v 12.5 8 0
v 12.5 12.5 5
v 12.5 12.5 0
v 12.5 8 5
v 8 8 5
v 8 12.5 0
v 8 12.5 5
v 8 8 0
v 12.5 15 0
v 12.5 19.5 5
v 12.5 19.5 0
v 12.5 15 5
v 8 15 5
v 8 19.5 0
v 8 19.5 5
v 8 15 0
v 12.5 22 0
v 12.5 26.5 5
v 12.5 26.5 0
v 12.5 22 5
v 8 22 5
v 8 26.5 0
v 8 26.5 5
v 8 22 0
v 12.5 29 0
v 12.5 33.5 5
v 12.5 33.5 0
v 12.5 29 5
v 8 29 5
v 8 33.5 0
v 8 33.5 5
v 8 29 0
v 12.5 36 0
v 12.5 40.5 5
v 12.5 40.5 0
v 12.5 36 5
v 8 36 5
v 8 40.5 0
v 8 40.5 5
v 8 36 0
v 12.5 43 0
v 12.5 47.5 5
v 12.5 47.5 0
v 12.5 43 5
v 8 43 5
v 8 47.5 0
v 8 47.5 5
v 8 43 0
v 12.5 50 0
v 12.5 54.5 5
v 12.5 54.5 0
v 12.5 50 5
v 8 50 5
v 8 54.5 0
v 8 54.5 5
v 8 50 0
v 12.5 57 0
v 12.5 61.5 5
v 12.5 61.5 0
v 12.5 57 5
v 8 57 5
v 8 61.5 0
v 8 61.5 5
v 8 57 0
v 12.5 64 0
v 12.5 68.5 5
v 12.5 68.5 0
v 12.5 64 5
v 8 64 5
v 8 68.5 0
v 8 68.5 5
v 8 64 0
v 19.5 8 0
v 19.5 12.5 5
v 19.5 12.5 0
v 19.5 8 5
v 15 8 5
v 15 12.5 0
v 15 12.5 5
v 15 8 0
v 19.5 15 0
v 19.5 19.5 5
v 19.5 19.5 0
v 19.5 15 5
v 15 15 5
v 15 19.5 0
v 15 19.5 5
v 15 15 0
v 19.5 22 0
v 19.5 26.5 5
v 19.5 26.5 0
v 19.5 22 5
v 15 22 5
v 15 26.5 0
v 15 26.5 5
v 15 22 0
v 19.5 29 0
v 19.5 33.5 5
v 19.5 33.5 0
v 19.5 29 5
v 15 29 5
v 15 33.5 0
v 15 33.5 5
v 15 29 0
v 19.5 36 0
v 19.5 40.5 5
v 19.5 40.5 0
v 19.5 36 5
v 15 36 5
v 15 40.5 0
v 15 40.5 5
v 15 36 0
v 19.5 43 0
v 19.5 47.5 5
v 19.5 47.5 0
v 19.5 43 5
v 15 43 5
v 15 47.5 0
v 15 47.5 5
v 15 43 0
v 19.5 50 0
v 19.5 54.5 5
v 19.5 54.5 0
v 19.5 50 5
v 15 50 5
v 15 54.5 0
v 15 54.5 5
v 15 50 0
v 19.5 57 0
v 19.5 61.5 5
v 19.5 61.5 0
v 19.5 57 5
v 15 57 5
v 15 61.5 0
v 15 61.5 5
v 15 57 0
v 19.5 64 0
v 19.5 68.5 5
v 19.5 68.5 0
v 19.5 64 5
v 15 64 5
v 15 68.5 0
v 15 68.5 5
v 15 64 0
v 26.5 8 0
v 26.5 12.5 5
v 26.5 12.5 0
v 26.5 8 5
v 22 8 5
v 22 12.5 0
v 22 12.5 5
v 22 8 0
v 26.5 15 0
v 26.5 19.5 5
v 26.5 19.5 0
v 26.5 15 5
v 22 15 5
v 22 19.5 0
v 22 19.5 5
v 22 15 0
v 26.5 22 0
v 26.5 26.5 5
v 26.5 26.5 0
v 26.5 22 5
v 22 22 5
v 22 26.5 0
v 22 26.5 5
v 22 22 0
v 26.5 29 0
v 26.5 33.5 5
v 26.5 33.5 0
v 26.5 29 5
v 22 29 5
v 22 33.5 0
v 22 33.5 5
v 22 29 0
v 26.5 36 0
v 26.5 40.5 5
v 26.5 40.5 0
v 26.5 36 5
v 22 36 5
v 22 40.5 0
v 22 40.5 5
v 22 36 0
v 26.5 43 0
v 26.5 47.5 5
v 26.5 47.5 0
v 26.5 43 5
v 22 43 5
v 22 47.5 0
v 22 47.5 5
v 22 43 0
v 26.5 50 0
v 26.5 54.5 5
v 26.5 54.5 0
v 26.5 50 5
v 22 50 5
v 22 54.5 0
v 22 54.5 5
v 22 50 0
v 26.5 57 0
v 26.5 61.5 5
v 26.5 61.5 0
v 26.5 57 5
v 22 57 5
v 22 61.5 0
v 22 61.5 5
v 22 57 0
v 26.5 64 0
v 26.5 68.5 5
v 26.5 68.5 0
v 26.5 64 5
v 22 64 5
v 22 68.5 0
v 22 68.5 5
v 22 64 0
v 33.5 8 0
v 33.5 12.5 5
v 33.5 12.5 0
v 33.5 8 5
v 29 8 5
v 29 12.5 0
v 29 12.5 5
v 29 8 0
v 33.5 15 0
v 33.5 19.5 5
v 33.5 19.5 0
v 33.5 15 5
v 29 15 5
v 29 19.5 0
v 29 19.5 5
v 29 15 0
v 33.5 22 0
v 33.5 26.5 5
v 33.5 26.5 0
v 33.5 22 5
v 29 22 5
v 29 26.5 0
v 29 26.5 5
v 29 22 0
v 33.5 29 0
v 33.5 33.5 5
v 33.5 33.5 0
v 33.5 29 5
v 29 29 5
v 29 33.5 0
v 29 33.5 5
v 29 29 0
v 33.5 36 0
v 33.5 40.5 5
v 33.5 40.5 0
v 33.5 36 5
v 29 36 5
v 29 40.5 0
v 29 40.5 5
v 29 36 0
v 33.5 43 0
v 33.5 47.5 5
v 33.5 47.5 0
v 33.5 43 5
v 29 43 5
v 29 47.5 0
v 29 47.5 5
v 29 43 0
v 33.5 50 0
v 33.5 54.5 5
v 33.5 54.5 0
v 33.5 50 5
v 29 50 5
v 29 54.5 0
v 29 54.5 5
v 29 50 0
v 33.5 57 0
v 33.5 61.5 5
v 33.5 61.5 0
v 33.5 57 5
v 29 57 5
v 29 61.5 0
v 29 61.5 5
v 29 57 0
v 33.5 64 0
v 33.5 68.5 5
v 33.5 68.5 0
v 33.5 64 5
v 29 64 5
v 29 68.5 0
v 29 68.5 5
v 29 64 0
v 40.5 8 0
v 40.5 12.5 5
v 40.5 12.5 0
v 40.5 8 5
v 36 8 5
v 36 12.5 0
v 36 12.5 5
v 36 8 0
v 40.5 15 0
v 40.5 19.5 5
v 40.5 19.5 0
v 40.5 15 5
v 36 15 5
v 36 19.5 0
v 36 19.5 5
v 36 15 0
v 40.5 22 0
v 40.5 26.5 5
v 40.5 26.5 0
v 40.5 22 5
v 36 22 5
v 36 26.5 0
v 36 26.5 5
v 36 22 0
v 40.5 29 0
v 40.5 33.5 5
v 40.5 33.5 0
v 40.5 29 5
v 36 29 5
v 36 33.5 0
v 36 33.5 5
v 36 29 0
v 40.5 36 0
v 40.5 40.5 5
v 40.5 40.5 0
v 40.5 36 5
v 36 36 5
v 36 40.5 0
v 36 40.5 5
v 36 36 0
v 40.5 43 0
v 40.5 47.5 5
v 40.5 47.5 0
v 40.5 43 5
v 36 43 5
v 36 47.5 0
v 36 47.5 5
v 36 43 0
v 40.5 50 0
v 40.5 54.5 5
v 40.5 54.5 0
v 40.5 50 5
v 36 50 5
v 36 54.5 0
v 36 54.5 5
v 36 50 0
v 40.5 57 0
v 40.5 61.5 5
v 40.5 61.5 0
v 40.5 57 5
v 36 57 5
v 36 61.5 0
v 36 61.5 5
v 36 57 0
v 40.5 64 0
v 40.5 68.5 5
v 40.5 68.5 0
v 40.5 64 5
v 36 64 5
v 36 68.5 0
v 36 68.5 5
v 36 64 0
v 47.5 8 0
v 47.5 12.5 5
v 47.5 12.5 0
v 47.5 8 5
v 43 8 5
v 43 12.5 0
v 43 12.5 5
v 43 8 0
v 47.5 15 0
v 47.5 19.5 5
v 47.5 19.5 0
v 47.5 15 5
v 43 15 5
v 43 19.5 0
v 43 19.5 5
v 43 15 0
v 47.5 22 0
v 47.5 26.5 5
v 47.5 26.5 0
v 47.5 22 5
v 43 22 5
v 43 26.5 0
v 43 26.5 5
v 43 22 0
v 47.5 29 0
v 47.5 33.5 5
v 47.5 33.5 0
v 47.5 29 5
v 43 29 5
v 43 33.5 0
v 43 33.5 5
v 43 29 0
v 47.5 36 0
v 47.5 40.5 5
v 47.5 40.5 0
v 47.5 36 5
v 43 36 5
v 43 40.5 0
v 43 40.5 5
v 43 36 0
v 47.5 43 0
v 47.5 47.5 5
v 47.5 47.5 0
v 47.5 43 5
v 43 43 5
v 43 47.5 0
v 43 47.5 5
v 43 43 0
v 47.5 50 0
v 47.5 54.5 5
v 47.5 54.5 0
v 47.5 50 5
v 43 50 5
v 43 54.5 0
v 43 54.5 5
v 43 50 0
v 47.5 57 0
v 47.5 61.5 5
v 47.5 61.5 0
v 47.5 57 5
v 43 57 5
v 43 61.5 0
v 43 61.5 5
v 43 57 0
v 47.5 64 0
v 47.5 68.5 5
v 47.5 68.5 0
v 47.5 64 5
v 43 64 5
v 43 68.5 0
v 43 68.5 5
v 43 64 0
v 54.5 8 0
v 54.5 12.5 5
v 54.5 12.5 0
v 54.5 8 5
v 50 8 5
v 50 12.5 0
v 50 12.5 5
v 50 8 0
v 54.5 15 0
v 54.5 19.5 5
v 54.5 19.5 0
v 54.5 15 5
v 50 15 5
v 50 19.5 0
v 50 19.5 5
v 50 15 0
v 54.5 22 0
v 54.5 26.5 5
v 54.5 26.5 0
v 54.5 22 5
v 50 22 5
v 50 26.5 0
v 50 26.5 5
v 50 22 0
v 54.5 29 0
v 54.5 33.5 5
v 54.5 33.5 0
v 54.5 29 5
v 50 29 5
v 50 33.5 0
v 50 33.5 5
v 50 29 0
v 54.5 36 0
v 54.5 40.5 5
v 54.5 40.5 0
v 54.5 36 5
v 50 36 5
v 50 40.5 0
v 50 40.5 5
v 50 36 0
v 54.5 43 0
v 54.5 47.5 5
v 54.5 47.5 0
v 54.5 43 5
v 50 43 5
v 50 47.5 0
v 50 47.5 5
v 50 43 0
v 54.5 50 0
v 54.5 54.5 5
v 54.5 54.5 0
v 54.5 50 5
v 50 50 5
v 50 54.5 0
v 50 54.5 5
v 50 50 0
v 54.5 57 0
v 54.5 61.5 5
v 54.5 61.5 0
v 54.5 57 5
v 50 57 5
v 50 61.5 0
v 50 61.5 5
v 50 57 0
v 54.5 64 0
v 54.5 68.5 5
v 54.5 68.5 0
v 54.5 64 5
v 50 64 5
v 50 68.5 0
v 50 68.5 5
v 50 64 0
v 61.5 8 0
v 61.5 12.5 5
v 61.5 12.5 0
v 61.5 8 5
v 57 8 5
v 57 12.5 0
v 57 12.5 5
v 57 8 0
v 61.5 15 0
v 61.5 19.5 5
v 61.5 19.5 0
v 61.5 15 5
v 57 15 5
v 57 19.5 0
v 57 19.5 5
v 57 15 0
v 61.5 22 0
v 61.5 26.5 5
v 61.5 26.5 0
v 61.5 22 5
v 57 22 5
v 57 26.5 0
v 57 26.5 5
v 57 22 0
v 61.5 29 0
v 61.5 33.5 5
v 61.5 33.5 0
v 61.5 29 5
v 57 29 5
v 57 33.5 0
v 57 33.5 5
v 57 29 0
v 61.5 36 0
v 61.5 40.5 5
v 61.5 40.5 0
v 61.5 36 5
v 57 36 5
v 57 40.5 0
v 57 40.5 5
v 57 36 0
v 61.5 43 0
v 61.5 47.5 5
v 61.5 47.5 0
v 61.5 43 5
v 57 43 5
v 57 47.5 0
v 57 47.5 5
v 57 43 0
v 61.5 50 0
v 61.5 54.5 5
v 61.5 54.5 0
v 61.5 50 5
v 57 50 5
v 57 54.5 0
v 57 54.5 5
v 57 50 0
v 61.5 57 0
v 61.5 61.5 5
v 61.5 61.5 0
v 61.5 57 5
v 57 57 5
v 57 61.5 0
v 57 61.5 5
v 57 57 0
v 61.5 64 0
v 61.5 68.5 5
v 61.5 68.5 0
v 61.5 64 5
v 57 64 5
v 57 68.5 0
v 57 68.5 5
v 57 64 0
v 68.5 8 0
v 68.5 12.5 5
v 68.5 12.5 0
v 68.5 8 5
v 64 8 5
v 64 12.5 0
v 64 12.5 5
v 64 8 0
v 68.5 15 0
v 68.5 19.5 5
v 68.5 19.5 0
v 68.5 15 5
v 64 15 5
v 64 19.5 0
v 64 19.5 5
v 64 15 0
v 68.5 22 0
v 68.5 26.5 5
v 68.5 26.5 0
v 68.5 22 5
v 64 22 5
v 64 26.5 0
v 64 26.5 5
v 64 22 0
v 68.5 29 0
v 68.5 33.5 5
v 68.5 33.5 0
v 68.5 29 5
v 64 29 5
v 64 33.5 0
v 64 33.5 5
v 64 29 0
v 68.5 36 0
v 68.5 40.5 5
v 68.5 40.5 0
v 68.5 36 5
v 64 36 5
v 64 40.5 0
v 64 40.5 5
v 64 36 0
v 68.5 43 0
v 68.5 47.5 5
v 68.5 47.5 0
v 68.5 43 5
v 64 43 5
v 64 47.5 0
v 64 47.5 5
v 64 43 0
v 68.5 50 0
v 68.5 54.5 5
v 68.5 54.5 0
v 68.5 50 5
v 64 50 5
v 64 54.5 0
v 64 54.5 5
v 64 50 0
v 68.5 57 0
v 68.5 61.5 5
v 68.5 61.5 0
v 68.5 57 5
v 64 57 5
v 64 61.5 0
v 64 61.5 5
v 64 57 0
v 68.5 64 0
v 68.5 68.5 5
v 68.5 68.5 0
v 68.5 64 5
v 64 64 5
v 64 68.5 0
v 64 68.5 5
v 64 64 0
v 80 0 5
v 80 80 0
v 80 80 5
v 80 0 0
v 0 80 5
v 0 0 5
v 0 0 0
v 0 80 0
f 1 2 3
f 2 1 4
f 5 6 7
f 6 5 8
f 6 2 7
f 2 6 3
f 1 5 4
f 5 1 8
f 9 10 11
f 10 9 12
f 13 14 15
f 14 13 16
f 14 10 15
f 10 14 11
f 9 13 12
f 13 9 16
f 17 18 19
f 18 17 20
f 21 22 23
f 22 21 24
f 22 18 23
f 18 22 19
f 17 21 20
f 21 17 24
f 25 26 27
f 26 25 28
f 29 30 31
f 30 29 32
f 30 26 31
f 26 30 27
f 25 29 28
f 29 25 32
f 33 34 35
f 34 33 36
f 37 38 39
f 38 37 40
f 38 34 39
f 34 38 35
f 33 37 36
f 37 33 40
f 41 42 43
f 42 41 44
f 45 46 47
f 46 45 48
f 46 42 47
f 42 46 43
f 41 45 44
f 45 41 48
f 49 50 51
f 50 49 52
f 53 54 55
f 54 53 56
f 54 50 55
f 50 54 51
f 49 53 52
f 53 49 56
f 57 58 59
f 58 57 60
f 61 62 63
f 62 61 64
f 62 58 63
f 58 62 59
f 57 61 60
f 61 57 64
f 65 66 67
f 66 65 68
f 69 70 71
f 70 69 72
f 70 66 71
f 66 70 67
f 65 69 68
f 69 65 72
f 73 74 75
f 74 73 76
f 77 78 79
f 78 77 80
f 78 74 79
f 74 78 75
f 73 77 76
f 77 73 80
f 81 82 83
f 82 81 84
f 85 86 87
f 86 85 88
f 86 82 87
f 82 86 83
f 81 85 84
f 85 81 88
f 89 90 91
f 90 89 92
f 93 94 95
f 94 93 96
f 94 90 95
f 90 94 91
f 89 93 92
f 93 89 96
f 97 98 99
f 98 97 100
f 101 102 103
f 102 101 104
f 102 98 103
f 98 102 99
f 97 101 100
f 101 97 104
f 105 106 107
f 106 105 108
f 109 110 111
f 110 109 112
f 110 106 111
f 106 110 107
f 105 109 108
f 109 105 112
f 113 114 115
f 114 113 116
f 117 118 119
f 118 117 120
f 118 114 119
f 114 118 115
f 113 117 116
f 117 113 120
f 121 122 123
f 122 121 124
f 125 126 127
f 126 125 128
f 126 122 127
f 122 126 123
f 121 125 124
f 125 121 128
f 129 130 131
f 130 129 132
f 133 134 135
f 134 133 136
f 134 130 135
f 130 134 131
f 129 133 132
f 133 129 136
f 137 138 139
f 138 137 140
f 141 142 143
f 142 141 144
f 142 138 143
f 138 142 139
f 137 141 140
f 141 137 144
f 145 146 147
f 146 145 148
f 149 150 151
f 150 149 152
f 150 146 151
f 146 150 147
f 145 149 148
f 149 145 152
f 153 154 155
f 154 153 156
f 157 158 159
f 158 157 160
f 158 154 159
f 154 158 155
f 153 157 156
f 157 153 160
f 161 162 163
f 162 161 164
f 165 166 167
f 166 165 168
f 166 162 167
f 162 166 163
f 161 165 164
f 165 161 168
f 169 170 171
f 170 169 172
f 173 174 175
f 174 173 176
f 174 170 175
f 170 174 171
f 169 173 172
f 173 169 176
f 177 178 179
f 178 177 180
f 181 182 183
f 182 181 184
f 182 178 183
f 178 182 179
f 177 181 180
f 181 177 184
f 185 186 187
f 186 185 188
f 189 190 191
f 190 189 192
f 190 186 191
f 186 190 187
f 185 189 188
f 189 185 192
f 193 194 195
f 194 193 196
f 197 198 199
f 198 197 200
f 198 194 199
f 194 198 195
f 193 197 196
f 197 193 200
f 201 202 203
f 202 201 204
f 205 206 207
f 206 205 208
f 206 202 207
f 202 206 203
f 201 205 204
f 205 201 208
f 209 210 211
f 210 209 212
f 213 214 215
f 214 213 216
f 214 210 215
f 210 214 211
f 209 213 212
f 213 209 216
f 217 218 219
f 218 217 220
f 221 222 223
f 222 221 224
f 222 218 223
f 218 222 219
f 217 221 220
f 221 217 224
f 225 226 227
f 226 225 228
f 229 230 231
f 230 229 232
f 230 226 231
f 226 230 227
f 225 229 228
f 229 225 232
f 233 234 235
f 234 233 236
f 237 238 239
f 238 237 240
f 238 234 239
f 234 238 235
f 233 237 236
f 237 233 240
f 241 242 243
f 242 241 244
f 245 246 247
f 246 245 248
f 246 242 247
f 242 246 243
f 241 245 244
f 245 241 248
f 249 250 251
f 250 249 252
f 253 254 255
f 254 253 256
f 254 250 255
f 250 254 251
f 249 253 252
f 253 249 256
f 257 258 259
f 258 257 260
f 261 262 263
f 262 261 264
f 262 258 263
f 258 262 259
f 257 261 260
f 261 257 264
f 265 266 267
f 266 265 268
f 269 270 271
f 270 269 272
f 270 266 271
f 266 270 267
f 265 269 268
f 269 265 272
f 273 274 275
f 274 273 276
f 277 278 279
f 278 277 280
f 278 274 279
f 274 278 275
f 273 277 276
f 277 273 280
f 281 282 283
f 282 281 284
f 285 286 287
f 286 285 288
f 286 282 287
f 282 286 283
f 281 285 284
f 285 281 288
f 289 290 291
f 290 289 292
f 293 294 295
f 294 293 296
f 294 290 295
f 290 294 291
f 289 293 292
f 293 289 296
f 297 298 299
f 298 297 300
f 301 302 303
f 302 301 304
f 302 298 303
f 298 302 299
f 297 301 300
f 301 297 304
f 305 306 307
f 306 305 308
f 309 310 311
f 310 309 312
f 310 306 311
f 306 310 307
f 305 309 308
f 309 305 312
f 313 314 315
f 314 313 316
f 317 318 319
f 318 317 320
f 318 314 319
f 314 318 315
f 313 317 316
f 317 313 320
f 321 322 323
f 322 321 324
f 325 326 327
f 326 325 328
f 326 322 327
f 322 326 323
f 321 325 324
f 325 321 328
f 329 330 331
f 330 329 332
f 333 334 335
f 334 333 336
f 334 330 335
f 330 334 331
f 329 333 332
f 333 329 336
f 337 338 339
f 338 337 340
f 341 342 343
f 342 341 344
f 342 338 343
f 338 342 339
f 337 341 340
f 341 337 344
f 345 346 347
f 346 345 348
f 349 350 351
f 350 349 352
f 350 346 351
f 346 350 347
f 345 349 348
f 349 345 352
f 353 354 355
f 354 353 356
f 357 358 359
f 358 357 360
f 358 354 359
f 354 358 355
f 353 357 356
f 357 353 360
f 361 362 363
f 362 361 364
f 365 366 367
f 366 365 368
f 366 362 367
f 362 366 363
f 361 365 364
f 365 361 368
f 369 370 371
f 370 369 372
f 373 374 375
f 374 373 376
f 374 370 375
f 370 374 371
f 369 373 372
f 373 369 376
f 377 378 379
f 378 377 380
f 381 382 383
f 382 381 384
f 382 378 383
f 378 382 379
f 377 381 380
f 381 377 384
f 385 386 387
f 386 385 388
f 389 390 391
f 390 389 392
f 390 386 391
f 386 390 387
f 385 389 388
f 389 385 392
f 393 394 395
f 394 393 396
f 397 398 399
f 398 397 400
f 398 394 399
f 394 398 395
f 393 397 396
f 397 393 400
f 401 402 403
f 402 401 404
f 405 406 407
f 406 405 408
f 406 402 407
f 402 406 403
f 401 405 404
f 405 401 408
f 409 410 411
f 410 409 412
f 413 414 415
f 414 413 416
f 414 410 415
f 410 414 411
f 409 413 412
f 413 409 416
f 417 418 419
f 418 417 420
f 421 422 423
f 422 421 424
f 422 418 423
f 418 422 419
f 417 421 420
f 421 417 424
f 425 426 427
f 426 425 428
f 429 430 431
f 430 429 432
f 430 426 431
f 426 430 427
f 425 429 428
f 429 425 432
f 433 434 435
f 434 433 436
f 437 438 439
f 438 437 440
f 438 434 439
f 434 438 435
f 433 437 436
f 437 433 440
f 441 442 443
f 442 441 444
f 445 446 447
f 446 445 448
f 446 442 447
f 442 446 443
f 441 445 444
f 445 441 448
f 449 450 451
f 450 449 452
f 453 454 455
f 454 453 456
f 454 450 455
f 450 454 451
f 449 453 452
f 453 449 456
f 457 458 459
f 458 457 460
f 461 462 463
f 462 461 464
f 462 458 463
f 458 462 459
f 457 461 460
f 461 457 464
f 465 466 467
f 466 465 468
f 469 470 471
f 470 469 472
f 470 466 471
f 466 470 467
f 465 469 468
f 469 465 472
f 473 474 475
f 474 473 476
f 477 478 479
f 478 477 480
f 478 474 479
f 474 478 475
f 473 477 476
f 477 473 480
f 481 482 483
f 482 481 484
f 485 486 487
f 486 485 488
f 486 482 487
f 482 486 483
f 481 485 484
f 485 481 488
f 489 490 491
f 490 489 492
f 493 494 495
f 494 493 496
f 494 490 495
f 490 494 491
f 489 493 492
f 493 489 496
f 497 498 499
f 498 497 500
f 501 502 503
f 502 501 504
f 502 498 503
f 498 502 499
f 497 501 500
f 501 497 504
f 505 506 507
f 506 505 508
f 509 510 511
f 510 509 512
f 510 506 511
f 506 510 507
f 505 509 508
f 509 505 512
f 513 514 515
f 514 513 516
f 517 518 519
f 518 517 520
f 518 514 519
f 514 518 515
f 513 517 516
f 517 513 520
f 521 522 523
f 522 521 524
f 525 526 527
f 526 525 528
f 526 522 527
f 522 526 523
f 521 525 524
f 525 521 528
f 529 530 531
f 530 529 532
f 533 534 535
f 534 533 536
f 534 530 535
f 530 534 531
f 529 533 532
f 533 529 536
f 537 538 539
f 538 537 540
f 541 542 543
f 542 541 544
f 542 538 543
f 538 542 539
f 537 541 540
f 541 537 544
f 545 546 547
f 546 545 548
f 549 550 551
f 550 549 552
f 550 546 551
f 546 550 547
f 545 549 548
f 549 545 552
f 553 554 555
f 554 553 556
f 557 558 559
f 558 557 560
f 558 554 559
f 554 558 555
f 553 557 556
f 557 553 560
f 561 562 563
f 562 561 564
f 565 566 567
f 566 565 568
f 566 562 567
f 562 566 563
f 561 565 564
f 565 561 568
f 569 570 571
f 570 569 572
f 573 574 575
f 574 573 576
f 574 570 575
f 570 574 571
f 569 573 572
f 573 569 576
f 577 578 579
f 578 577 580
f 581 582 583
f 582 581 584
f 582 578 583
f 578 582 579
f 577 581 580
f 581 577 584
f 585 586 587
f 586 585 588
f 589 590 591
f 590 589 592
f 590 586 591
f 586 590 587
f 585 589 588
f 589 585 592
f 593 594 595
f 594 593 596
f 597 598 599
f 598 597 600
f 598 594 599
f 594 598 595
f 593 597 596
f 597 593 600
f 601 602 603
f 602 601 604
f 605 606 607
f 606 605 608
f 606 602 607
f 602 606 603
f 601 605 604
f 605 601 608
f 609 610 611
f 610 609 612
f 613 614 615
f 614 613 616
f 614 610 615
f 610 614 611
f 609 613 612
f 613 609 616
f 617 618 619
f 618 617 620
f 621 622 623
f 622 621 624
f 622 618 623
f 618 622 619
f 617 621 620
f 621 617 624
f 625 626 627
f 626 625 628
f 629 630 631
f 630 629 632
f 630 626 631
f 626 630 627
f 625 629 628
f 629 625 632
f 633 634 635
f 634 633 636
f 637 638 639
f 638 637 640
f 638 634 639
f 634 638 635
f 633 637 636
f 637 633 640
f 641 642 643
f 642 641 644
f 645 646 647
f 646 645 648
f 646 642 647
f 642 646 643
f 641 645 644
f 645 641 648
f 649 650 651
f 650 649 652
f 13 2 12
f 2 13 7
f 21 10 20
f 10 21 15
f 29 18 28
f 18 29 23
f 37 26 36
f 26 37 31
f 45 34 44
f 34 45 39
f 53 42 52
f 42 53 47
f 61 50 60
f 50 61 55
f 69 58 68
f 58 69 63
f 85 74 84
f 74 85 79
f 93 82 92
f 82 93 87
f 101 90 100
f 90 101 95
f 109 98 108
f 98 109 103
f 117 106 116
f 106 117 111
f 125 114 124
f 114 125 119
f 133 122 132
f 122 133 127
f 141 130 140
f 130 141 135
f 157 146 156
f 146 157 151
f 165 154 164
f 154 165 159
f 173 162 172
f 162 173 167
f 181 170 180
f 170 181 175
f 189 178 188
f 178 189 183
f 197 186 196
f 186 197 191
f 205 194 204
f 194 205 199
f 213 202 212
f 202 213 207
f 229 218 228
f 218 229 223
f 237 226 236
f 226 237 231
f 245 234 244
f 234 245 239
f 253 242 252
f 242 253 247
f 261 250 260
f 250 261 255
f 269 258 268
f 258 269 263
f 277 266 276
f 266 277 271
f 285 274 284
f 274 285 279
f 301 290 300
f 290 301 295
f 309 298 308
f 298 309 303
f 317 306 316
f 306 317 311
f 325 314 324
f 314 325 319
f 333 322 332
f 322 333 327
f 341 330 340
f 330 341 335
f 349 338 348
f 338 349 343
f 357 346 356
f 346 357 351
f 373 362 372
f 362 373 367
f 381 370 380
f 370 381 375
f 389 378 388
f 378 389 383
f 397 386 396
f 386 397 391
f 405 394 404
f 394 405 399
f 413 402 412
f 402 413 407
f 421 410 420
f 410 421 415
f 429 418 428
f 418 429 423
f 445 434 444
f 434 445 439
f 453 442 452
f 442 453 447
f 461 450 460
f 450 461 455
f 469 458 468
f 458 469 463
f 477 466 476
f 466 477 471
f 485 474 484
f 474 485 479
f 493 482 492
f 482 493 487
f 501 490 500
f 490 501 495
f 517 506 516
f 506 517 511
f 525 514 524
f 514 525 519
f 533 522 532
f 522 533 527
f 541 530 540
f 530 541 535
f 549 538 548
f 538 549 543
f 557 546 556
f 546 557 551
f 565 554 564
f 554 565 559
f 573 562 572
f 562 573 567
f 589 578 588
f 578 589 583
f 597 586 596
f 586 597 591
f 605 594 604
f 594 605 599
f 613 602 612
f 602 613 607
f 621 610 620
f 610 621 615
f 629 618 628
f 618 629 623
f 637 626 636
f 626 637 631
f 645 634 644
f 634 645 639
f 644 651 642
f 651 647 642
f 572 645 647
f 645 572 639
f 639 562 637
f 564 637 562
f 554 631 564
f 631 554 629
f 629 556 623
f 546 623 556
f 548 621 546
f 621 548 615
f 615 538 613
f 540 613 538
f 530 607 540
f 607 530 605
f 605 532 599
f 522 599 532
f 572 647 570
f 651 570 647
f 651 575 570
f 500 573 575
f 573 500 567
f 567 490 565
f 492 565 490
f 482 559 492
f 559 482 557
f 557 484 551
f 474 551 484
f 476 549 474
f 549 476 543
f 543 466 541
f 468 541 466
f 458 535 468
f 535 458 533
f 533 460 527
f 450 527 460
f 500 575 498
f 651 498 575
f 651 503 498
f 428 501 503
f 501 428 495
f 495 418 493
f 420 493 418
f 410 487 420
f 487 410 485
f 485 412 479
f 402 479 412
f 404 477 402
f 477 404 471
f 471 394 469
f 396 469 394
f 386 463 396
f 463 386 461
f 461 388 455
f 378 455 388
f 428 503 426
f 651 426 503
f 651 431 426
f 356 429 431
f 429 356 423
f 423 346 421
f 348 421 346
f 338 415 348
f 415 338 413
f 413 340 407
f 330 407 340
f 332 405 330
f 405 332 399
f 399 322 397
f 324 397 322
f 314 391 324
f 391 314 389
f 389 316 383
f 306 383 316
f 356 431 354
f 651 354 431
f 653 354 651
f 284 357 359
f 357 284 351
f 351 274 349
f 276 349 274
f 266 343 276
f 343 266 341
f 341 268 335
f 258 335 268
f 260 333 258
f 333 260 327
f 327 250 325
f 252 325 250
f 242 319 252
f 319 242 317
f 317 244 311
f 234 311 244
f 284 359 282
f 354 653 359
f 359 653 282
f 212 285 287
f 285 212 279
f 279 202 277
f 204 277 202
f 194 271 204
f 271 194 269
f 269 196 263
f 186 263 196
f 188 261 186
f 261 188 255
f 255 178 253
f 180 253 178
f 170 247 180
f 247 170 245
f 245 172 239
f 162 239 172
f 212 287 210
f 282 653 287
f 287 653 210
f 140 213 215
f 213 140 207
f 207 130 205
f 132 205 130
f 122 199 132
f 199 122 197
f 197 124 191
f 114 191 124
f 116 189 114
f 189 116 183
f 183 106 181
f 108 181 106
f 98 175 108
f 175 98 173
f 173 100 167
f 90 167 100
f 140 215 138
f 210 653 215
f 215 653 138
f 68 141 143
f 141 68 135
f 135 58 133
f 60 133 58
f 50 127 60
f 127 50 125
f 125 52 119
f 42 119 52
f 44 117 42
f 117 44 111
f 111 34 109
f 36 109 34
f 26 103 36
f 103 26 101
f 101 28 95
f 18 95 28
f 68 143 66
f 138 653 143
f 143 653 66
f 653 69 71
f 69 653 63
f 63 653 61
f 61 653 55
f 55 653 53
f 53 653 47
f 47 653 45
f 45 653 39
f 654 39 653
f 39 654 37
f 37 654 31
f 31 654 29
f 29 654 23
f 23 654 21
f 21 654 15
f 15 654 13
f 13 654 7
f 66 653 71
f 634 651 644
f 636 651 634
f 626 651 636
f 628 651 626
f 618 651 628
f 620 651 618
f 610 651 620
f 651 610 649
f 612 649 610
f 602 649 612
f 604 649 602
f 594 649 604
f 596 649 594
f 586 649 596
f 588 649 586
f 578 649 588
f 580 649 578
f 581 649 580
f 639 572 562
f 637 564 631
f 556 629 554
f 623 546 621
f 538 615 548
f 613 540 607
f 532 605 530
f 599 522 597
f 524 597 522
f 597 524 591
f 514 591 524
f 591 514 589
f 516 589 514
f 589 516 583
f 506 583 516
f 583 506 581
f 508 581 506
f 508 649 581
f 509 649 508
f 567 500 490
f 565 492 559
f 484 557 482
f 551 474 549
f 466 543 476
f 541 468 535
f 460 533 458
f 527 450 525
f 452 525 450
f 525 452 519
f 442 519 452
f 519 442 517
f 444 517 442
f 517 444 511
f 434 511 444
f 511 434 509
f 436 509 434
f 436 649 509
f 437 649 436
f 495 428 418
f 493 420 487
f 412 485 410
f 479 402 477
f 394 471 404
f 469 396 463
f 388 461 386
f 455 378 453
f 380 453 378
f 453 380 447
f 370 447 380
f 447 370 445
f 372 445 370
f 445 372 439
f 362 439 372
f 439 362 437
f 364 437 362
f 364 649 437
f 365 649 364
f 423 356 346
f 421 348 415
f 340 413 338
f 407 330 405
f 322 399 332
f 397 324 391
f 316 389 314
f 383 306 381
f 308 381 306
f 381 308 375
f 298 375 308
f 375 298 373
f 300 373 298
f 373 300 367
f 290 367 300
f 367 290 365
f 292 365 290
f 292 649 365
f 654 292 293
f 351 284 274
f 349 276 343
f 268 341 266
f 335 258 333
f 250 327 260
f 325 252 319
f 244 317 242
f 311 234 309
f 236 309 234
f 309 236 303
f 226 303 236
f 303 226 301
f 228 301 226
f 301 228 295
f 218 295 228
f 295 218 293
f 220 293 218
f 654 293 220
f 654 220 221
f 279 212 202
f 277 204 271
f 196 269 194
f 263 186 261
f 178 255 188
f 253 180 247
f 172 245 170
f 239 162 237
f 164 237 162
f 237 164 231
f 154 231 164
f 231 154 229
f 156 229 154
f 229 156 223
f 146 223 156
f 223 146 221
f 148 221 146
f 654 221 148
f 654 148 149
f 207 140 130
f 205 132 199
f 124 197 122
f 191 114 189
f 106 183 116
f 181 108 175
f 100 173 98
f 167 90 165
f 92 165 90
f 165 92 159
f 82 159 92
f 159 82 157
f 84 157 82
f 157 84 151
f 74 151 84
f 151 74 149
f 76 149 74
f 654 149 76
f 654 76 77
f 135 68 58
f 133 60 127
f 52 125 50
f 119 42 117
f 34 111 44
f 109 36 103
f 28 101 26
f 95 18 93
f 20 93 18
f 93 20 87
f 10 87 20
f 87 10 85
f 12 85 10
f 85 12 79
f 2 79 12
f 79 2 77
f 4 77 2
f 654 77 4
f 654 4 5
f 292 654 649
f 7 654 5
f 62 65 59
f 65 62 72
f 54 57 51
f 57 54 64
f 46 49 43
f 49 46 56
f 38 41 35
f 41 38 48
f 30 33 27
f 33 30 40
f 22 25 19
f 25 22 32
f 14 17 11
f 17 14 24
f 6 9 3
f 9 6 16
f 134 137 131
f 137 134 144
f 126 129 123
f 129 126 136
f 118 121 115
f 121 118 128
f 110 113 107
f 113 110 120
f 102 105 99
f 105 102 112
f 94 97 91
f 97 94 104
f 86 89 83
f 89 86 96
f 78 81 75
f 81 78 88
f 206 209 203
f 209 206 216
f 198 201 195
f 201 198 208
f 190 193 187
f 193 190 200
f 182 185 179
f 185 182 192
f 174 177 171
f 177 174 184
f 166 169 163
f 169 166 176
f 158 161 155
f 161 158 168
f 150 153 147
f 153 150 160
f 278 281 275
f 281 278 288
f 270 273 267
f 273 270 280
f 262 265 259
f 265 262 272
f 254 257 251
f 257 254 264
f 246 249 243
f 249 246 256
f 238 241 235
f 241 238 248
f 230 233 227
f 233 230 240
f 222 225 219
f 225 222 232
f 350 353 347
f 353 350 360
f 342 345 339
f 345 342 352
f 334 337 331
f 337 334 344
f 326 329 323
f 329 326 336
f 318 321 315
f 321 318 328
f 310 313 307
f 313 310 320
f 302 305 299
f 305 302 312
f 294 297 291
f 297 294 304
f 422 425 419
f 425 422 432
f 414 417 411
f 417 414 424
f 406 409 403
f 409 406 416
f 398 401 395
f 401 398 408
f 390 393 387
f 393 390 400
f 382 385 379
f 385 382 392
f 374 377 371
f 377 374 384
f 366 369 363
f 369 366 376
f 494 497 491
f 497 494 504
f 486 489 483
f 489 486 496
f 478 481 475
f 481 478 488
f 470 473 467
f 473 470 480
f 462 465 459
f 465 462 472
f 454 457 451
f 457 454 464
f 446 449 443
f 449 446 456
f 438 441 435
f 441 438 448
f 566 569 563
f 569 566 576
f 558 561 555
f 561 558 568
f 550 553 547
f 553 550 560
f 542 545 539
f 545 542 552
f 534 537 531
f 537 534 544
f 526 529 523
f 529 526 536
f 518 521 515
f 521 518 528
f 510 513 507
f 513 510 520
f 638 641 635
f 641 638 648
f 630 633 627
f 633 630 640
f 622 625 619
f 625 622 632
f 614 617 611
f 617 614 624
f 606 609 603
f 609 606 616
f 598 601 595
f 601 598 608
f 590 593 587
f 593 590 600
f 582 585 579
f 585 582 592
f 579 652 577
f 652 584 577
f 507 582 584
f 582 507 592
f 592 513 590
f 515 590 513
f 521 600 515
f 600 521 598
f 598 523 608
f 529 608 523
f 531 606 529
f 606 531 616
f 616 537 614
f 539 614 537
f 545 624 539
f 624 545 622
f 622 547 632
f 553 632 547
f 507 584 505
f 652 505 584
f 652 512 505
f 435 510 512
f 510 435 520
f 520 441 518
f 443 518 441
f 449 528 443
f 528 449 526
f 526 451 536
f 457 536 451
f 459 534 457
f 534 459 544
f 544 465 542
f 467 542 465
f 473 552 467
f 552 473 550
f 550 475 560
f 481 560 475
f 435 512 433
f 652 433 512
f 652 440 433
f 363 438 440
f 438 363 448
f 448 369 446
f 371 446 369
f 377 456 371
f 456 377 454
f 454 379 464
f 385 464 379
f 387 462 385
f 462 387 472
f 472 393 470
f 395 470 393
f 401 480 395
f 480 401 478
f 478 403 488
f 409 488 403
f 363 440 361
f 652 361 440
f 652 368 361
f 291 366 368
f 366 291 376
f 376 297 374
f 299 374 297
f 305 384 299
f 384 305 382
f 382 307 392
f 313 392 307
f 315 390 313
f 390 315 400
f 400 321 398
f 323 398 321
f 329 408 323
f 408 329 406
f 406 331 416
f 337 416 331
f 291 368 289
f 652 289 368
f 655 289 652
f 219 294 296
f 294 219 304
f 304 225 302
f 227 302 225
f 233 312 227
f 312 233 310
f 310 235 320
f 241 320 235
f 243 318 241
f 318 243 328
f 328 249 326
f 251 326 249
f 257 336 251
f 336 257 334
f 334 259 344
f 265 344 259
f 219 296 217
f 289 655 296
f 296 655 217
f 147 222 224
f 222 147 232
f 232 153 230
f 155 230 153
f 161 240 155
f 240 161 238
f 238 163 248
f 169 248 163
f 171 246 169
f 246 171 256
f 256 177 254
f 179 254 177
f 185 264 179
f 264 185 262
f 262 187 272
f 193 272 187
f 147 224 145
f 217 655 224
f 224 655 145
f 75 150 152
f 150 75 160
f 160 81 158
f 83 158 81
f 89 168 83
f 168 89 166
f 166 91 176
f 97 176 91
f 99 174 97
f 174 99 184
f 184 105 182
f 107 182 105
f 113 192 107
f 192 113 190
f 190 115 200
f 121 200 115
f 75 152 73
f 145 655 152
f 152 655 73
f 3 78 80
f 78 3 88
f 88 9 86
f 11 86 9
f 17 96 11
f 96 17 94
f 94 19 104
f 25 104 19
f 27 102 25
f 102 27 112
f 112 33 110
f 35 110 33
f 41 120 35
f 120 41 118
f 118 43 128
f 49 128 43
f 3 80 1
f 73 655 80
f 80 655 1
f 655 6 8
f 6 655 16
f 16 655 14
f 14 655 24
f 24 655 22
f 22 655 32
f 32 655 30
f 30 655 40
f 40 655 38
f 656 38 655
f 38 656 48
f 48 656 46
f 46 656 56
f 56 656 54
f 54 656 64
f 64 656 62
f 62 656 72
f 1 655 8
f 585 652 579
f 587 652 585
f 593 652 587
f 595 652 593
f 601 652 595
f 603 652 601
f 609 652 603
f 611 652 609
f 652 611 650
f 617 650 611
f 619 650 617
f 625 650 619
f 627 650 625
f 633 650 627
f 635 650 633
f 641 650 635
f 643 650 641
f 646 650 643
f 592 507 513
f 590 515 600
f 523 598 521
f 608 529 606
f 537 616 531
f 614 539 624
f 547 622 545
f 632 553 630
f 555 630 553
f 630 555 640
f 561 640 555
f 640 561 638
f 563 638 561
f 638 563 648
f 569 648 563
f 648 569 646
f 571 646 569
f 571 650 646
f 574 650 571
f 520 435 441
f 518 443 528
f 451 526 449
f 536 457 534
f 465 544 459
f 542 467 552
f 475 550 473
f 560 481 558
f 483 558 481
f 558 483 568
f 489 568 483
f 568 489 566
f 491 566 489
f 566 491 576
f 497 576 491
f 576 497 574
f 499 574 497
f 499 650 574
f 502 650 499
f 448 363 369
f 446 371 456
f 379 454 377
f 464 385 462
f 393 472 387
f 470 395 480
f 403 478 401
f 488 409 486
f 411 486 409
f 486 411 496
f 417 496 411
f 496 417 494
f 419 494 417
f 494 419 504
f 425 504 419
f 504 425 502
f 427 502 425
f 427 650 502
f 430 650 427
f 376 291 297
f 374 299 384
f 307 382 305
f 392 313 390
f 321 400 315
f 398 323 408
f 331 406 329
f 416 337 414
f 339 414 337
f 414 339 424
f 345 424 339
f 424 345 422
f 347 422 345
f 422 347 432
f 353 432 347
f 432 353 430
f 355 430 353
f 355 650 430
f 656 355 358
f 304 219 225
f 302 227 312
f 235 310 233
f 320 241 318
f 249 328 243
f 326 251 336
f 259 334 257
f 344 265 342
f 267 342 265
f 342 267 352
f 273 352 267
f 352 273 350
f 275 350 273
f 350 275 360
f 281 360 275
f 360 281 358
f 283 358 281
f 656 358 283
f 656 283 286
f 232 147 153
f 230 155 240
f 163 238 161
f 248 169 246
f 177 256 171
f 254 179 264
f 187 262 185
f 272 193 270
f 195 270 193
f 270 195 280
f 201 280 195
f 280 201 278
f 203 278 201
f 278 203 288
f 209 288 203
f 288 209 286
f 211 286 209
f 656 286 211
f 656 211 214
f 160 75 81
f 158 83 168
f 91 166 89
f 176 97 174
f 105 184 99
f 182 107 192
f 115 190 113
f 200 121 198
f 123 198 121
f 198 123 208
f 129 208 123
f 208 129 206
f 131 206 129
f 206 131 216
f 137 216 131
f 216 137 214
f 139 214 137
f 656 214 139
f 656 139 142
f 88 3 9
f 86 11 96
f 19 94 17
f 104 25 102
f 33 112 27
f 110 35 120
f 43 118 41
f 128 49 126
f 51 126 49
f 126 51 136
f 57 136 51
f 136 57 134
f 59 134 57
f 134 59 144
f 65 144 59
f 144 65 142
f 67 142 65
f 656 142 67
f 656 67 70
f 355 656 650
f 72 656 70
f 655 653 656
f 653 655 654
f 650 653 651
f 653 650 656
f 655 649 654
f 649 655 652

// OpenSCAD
x = 80;
y = 80;
z = 5;


color("lightblue")
difference(){
    cube([x, y, z]);
    for(i = [0:x/10]){
        for(j = [0:y/10]){
            translate([x/10 + i*7, y/10 + j*7, -1]){
                cube([4.5, 4.5, z+2]);
            }
        }
    }
}
